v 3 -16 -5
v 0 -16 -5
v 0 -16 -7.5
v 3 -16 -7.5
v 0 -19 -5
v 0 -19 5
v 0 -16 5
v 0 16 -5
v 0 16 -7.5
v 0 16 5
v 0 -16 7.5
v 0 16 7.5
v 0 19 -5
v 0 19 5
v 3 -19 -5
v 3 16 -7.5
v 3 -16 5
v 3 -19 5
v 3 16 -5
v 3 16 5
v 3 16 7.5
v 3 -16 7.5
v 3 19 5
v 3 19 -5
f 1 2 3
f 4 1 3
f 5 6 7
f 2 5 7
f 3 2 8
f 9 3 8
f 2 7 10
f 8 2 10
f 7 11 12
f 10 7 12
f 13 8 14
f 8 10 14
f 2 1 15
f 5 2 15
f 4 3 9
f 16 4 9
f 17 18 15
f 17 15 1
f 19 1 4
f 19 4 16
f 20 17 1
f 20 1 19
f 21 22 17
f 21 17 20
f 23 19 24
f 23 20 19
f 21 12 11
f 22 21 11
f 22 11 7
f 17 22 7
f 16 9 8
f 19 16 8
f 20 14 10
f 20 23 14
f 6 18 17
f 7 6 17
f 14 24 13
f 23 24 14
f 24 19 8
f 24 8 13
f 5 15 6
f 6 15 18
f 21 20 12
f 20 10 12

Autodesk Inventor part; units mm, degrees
ref_plane "YZ Plane" through (0, 0, 0) normal (1, 0, 0) x (0, 1, 0)
ref_plane "XZ Plane" through (0, 0, 0) normal (0, 1, 0) x (-1, 0, 0)
ref_plane "XY Plane" through (0, 0, 0) normal (0, 0, 1) x (1, 0, 0)
sketch "Sketch1" plane through (0, 0, 0) normal (1, 0, 0) x (0, 1, 0)
  line L0 (-16, -7.5) -> (16, -7.5)
  line L1 (16, -7.5) -> (16, 7.5)
  line L2 (16, 7.5) -> (-16, 7.5)
  line L3 (-16, 7.5) -> (-16, -7.5)
  line L4 (-16, -7.5) -> (16, 7.5) construction
  line L5 (16, -7.5) -> (-16, 7.5) construction
  point P0 (0, 0)
  dimension "d0" = 32
  dimension "d1" = 15
extrude "Extrusion1" add sketch "Sketch1" along normal blind 3
sketch "Sketch2" plane through (3, 0, 0) normal (1, 0, 0) x (0, 0, -1)
  line L0 (7.5, 16) -> (-7.5, 16) projected
  line L1 (-5, 16) -> (5, 16)
  line L2 (5, 16) -> (5, 19)
  line L3 (5, 19) -> (-5, 19)
  line L4 (-5, 19) -> (-5, 16)
  line L5 (-5, -16) -> (5, -16)
  line L6 (5, -16) -> (5, -19)
  line L7 (5, -19) -> (-5, -19)
  line L8 (-5, -19) -> (-5, -16)
  line L9 (-7.5, -16) -> (7.5, -16) projected
  point P0 (0, 0)
  point P1 (0, 19)
  dimension "d4" = 10
  dimension "d5" = 3
  dimension "d6" = 10
  dimension "d7" = 3
extrude "Extrusion2" add sketch "Sketch2" against normal blind 3
properties part number "Mid rib support"
